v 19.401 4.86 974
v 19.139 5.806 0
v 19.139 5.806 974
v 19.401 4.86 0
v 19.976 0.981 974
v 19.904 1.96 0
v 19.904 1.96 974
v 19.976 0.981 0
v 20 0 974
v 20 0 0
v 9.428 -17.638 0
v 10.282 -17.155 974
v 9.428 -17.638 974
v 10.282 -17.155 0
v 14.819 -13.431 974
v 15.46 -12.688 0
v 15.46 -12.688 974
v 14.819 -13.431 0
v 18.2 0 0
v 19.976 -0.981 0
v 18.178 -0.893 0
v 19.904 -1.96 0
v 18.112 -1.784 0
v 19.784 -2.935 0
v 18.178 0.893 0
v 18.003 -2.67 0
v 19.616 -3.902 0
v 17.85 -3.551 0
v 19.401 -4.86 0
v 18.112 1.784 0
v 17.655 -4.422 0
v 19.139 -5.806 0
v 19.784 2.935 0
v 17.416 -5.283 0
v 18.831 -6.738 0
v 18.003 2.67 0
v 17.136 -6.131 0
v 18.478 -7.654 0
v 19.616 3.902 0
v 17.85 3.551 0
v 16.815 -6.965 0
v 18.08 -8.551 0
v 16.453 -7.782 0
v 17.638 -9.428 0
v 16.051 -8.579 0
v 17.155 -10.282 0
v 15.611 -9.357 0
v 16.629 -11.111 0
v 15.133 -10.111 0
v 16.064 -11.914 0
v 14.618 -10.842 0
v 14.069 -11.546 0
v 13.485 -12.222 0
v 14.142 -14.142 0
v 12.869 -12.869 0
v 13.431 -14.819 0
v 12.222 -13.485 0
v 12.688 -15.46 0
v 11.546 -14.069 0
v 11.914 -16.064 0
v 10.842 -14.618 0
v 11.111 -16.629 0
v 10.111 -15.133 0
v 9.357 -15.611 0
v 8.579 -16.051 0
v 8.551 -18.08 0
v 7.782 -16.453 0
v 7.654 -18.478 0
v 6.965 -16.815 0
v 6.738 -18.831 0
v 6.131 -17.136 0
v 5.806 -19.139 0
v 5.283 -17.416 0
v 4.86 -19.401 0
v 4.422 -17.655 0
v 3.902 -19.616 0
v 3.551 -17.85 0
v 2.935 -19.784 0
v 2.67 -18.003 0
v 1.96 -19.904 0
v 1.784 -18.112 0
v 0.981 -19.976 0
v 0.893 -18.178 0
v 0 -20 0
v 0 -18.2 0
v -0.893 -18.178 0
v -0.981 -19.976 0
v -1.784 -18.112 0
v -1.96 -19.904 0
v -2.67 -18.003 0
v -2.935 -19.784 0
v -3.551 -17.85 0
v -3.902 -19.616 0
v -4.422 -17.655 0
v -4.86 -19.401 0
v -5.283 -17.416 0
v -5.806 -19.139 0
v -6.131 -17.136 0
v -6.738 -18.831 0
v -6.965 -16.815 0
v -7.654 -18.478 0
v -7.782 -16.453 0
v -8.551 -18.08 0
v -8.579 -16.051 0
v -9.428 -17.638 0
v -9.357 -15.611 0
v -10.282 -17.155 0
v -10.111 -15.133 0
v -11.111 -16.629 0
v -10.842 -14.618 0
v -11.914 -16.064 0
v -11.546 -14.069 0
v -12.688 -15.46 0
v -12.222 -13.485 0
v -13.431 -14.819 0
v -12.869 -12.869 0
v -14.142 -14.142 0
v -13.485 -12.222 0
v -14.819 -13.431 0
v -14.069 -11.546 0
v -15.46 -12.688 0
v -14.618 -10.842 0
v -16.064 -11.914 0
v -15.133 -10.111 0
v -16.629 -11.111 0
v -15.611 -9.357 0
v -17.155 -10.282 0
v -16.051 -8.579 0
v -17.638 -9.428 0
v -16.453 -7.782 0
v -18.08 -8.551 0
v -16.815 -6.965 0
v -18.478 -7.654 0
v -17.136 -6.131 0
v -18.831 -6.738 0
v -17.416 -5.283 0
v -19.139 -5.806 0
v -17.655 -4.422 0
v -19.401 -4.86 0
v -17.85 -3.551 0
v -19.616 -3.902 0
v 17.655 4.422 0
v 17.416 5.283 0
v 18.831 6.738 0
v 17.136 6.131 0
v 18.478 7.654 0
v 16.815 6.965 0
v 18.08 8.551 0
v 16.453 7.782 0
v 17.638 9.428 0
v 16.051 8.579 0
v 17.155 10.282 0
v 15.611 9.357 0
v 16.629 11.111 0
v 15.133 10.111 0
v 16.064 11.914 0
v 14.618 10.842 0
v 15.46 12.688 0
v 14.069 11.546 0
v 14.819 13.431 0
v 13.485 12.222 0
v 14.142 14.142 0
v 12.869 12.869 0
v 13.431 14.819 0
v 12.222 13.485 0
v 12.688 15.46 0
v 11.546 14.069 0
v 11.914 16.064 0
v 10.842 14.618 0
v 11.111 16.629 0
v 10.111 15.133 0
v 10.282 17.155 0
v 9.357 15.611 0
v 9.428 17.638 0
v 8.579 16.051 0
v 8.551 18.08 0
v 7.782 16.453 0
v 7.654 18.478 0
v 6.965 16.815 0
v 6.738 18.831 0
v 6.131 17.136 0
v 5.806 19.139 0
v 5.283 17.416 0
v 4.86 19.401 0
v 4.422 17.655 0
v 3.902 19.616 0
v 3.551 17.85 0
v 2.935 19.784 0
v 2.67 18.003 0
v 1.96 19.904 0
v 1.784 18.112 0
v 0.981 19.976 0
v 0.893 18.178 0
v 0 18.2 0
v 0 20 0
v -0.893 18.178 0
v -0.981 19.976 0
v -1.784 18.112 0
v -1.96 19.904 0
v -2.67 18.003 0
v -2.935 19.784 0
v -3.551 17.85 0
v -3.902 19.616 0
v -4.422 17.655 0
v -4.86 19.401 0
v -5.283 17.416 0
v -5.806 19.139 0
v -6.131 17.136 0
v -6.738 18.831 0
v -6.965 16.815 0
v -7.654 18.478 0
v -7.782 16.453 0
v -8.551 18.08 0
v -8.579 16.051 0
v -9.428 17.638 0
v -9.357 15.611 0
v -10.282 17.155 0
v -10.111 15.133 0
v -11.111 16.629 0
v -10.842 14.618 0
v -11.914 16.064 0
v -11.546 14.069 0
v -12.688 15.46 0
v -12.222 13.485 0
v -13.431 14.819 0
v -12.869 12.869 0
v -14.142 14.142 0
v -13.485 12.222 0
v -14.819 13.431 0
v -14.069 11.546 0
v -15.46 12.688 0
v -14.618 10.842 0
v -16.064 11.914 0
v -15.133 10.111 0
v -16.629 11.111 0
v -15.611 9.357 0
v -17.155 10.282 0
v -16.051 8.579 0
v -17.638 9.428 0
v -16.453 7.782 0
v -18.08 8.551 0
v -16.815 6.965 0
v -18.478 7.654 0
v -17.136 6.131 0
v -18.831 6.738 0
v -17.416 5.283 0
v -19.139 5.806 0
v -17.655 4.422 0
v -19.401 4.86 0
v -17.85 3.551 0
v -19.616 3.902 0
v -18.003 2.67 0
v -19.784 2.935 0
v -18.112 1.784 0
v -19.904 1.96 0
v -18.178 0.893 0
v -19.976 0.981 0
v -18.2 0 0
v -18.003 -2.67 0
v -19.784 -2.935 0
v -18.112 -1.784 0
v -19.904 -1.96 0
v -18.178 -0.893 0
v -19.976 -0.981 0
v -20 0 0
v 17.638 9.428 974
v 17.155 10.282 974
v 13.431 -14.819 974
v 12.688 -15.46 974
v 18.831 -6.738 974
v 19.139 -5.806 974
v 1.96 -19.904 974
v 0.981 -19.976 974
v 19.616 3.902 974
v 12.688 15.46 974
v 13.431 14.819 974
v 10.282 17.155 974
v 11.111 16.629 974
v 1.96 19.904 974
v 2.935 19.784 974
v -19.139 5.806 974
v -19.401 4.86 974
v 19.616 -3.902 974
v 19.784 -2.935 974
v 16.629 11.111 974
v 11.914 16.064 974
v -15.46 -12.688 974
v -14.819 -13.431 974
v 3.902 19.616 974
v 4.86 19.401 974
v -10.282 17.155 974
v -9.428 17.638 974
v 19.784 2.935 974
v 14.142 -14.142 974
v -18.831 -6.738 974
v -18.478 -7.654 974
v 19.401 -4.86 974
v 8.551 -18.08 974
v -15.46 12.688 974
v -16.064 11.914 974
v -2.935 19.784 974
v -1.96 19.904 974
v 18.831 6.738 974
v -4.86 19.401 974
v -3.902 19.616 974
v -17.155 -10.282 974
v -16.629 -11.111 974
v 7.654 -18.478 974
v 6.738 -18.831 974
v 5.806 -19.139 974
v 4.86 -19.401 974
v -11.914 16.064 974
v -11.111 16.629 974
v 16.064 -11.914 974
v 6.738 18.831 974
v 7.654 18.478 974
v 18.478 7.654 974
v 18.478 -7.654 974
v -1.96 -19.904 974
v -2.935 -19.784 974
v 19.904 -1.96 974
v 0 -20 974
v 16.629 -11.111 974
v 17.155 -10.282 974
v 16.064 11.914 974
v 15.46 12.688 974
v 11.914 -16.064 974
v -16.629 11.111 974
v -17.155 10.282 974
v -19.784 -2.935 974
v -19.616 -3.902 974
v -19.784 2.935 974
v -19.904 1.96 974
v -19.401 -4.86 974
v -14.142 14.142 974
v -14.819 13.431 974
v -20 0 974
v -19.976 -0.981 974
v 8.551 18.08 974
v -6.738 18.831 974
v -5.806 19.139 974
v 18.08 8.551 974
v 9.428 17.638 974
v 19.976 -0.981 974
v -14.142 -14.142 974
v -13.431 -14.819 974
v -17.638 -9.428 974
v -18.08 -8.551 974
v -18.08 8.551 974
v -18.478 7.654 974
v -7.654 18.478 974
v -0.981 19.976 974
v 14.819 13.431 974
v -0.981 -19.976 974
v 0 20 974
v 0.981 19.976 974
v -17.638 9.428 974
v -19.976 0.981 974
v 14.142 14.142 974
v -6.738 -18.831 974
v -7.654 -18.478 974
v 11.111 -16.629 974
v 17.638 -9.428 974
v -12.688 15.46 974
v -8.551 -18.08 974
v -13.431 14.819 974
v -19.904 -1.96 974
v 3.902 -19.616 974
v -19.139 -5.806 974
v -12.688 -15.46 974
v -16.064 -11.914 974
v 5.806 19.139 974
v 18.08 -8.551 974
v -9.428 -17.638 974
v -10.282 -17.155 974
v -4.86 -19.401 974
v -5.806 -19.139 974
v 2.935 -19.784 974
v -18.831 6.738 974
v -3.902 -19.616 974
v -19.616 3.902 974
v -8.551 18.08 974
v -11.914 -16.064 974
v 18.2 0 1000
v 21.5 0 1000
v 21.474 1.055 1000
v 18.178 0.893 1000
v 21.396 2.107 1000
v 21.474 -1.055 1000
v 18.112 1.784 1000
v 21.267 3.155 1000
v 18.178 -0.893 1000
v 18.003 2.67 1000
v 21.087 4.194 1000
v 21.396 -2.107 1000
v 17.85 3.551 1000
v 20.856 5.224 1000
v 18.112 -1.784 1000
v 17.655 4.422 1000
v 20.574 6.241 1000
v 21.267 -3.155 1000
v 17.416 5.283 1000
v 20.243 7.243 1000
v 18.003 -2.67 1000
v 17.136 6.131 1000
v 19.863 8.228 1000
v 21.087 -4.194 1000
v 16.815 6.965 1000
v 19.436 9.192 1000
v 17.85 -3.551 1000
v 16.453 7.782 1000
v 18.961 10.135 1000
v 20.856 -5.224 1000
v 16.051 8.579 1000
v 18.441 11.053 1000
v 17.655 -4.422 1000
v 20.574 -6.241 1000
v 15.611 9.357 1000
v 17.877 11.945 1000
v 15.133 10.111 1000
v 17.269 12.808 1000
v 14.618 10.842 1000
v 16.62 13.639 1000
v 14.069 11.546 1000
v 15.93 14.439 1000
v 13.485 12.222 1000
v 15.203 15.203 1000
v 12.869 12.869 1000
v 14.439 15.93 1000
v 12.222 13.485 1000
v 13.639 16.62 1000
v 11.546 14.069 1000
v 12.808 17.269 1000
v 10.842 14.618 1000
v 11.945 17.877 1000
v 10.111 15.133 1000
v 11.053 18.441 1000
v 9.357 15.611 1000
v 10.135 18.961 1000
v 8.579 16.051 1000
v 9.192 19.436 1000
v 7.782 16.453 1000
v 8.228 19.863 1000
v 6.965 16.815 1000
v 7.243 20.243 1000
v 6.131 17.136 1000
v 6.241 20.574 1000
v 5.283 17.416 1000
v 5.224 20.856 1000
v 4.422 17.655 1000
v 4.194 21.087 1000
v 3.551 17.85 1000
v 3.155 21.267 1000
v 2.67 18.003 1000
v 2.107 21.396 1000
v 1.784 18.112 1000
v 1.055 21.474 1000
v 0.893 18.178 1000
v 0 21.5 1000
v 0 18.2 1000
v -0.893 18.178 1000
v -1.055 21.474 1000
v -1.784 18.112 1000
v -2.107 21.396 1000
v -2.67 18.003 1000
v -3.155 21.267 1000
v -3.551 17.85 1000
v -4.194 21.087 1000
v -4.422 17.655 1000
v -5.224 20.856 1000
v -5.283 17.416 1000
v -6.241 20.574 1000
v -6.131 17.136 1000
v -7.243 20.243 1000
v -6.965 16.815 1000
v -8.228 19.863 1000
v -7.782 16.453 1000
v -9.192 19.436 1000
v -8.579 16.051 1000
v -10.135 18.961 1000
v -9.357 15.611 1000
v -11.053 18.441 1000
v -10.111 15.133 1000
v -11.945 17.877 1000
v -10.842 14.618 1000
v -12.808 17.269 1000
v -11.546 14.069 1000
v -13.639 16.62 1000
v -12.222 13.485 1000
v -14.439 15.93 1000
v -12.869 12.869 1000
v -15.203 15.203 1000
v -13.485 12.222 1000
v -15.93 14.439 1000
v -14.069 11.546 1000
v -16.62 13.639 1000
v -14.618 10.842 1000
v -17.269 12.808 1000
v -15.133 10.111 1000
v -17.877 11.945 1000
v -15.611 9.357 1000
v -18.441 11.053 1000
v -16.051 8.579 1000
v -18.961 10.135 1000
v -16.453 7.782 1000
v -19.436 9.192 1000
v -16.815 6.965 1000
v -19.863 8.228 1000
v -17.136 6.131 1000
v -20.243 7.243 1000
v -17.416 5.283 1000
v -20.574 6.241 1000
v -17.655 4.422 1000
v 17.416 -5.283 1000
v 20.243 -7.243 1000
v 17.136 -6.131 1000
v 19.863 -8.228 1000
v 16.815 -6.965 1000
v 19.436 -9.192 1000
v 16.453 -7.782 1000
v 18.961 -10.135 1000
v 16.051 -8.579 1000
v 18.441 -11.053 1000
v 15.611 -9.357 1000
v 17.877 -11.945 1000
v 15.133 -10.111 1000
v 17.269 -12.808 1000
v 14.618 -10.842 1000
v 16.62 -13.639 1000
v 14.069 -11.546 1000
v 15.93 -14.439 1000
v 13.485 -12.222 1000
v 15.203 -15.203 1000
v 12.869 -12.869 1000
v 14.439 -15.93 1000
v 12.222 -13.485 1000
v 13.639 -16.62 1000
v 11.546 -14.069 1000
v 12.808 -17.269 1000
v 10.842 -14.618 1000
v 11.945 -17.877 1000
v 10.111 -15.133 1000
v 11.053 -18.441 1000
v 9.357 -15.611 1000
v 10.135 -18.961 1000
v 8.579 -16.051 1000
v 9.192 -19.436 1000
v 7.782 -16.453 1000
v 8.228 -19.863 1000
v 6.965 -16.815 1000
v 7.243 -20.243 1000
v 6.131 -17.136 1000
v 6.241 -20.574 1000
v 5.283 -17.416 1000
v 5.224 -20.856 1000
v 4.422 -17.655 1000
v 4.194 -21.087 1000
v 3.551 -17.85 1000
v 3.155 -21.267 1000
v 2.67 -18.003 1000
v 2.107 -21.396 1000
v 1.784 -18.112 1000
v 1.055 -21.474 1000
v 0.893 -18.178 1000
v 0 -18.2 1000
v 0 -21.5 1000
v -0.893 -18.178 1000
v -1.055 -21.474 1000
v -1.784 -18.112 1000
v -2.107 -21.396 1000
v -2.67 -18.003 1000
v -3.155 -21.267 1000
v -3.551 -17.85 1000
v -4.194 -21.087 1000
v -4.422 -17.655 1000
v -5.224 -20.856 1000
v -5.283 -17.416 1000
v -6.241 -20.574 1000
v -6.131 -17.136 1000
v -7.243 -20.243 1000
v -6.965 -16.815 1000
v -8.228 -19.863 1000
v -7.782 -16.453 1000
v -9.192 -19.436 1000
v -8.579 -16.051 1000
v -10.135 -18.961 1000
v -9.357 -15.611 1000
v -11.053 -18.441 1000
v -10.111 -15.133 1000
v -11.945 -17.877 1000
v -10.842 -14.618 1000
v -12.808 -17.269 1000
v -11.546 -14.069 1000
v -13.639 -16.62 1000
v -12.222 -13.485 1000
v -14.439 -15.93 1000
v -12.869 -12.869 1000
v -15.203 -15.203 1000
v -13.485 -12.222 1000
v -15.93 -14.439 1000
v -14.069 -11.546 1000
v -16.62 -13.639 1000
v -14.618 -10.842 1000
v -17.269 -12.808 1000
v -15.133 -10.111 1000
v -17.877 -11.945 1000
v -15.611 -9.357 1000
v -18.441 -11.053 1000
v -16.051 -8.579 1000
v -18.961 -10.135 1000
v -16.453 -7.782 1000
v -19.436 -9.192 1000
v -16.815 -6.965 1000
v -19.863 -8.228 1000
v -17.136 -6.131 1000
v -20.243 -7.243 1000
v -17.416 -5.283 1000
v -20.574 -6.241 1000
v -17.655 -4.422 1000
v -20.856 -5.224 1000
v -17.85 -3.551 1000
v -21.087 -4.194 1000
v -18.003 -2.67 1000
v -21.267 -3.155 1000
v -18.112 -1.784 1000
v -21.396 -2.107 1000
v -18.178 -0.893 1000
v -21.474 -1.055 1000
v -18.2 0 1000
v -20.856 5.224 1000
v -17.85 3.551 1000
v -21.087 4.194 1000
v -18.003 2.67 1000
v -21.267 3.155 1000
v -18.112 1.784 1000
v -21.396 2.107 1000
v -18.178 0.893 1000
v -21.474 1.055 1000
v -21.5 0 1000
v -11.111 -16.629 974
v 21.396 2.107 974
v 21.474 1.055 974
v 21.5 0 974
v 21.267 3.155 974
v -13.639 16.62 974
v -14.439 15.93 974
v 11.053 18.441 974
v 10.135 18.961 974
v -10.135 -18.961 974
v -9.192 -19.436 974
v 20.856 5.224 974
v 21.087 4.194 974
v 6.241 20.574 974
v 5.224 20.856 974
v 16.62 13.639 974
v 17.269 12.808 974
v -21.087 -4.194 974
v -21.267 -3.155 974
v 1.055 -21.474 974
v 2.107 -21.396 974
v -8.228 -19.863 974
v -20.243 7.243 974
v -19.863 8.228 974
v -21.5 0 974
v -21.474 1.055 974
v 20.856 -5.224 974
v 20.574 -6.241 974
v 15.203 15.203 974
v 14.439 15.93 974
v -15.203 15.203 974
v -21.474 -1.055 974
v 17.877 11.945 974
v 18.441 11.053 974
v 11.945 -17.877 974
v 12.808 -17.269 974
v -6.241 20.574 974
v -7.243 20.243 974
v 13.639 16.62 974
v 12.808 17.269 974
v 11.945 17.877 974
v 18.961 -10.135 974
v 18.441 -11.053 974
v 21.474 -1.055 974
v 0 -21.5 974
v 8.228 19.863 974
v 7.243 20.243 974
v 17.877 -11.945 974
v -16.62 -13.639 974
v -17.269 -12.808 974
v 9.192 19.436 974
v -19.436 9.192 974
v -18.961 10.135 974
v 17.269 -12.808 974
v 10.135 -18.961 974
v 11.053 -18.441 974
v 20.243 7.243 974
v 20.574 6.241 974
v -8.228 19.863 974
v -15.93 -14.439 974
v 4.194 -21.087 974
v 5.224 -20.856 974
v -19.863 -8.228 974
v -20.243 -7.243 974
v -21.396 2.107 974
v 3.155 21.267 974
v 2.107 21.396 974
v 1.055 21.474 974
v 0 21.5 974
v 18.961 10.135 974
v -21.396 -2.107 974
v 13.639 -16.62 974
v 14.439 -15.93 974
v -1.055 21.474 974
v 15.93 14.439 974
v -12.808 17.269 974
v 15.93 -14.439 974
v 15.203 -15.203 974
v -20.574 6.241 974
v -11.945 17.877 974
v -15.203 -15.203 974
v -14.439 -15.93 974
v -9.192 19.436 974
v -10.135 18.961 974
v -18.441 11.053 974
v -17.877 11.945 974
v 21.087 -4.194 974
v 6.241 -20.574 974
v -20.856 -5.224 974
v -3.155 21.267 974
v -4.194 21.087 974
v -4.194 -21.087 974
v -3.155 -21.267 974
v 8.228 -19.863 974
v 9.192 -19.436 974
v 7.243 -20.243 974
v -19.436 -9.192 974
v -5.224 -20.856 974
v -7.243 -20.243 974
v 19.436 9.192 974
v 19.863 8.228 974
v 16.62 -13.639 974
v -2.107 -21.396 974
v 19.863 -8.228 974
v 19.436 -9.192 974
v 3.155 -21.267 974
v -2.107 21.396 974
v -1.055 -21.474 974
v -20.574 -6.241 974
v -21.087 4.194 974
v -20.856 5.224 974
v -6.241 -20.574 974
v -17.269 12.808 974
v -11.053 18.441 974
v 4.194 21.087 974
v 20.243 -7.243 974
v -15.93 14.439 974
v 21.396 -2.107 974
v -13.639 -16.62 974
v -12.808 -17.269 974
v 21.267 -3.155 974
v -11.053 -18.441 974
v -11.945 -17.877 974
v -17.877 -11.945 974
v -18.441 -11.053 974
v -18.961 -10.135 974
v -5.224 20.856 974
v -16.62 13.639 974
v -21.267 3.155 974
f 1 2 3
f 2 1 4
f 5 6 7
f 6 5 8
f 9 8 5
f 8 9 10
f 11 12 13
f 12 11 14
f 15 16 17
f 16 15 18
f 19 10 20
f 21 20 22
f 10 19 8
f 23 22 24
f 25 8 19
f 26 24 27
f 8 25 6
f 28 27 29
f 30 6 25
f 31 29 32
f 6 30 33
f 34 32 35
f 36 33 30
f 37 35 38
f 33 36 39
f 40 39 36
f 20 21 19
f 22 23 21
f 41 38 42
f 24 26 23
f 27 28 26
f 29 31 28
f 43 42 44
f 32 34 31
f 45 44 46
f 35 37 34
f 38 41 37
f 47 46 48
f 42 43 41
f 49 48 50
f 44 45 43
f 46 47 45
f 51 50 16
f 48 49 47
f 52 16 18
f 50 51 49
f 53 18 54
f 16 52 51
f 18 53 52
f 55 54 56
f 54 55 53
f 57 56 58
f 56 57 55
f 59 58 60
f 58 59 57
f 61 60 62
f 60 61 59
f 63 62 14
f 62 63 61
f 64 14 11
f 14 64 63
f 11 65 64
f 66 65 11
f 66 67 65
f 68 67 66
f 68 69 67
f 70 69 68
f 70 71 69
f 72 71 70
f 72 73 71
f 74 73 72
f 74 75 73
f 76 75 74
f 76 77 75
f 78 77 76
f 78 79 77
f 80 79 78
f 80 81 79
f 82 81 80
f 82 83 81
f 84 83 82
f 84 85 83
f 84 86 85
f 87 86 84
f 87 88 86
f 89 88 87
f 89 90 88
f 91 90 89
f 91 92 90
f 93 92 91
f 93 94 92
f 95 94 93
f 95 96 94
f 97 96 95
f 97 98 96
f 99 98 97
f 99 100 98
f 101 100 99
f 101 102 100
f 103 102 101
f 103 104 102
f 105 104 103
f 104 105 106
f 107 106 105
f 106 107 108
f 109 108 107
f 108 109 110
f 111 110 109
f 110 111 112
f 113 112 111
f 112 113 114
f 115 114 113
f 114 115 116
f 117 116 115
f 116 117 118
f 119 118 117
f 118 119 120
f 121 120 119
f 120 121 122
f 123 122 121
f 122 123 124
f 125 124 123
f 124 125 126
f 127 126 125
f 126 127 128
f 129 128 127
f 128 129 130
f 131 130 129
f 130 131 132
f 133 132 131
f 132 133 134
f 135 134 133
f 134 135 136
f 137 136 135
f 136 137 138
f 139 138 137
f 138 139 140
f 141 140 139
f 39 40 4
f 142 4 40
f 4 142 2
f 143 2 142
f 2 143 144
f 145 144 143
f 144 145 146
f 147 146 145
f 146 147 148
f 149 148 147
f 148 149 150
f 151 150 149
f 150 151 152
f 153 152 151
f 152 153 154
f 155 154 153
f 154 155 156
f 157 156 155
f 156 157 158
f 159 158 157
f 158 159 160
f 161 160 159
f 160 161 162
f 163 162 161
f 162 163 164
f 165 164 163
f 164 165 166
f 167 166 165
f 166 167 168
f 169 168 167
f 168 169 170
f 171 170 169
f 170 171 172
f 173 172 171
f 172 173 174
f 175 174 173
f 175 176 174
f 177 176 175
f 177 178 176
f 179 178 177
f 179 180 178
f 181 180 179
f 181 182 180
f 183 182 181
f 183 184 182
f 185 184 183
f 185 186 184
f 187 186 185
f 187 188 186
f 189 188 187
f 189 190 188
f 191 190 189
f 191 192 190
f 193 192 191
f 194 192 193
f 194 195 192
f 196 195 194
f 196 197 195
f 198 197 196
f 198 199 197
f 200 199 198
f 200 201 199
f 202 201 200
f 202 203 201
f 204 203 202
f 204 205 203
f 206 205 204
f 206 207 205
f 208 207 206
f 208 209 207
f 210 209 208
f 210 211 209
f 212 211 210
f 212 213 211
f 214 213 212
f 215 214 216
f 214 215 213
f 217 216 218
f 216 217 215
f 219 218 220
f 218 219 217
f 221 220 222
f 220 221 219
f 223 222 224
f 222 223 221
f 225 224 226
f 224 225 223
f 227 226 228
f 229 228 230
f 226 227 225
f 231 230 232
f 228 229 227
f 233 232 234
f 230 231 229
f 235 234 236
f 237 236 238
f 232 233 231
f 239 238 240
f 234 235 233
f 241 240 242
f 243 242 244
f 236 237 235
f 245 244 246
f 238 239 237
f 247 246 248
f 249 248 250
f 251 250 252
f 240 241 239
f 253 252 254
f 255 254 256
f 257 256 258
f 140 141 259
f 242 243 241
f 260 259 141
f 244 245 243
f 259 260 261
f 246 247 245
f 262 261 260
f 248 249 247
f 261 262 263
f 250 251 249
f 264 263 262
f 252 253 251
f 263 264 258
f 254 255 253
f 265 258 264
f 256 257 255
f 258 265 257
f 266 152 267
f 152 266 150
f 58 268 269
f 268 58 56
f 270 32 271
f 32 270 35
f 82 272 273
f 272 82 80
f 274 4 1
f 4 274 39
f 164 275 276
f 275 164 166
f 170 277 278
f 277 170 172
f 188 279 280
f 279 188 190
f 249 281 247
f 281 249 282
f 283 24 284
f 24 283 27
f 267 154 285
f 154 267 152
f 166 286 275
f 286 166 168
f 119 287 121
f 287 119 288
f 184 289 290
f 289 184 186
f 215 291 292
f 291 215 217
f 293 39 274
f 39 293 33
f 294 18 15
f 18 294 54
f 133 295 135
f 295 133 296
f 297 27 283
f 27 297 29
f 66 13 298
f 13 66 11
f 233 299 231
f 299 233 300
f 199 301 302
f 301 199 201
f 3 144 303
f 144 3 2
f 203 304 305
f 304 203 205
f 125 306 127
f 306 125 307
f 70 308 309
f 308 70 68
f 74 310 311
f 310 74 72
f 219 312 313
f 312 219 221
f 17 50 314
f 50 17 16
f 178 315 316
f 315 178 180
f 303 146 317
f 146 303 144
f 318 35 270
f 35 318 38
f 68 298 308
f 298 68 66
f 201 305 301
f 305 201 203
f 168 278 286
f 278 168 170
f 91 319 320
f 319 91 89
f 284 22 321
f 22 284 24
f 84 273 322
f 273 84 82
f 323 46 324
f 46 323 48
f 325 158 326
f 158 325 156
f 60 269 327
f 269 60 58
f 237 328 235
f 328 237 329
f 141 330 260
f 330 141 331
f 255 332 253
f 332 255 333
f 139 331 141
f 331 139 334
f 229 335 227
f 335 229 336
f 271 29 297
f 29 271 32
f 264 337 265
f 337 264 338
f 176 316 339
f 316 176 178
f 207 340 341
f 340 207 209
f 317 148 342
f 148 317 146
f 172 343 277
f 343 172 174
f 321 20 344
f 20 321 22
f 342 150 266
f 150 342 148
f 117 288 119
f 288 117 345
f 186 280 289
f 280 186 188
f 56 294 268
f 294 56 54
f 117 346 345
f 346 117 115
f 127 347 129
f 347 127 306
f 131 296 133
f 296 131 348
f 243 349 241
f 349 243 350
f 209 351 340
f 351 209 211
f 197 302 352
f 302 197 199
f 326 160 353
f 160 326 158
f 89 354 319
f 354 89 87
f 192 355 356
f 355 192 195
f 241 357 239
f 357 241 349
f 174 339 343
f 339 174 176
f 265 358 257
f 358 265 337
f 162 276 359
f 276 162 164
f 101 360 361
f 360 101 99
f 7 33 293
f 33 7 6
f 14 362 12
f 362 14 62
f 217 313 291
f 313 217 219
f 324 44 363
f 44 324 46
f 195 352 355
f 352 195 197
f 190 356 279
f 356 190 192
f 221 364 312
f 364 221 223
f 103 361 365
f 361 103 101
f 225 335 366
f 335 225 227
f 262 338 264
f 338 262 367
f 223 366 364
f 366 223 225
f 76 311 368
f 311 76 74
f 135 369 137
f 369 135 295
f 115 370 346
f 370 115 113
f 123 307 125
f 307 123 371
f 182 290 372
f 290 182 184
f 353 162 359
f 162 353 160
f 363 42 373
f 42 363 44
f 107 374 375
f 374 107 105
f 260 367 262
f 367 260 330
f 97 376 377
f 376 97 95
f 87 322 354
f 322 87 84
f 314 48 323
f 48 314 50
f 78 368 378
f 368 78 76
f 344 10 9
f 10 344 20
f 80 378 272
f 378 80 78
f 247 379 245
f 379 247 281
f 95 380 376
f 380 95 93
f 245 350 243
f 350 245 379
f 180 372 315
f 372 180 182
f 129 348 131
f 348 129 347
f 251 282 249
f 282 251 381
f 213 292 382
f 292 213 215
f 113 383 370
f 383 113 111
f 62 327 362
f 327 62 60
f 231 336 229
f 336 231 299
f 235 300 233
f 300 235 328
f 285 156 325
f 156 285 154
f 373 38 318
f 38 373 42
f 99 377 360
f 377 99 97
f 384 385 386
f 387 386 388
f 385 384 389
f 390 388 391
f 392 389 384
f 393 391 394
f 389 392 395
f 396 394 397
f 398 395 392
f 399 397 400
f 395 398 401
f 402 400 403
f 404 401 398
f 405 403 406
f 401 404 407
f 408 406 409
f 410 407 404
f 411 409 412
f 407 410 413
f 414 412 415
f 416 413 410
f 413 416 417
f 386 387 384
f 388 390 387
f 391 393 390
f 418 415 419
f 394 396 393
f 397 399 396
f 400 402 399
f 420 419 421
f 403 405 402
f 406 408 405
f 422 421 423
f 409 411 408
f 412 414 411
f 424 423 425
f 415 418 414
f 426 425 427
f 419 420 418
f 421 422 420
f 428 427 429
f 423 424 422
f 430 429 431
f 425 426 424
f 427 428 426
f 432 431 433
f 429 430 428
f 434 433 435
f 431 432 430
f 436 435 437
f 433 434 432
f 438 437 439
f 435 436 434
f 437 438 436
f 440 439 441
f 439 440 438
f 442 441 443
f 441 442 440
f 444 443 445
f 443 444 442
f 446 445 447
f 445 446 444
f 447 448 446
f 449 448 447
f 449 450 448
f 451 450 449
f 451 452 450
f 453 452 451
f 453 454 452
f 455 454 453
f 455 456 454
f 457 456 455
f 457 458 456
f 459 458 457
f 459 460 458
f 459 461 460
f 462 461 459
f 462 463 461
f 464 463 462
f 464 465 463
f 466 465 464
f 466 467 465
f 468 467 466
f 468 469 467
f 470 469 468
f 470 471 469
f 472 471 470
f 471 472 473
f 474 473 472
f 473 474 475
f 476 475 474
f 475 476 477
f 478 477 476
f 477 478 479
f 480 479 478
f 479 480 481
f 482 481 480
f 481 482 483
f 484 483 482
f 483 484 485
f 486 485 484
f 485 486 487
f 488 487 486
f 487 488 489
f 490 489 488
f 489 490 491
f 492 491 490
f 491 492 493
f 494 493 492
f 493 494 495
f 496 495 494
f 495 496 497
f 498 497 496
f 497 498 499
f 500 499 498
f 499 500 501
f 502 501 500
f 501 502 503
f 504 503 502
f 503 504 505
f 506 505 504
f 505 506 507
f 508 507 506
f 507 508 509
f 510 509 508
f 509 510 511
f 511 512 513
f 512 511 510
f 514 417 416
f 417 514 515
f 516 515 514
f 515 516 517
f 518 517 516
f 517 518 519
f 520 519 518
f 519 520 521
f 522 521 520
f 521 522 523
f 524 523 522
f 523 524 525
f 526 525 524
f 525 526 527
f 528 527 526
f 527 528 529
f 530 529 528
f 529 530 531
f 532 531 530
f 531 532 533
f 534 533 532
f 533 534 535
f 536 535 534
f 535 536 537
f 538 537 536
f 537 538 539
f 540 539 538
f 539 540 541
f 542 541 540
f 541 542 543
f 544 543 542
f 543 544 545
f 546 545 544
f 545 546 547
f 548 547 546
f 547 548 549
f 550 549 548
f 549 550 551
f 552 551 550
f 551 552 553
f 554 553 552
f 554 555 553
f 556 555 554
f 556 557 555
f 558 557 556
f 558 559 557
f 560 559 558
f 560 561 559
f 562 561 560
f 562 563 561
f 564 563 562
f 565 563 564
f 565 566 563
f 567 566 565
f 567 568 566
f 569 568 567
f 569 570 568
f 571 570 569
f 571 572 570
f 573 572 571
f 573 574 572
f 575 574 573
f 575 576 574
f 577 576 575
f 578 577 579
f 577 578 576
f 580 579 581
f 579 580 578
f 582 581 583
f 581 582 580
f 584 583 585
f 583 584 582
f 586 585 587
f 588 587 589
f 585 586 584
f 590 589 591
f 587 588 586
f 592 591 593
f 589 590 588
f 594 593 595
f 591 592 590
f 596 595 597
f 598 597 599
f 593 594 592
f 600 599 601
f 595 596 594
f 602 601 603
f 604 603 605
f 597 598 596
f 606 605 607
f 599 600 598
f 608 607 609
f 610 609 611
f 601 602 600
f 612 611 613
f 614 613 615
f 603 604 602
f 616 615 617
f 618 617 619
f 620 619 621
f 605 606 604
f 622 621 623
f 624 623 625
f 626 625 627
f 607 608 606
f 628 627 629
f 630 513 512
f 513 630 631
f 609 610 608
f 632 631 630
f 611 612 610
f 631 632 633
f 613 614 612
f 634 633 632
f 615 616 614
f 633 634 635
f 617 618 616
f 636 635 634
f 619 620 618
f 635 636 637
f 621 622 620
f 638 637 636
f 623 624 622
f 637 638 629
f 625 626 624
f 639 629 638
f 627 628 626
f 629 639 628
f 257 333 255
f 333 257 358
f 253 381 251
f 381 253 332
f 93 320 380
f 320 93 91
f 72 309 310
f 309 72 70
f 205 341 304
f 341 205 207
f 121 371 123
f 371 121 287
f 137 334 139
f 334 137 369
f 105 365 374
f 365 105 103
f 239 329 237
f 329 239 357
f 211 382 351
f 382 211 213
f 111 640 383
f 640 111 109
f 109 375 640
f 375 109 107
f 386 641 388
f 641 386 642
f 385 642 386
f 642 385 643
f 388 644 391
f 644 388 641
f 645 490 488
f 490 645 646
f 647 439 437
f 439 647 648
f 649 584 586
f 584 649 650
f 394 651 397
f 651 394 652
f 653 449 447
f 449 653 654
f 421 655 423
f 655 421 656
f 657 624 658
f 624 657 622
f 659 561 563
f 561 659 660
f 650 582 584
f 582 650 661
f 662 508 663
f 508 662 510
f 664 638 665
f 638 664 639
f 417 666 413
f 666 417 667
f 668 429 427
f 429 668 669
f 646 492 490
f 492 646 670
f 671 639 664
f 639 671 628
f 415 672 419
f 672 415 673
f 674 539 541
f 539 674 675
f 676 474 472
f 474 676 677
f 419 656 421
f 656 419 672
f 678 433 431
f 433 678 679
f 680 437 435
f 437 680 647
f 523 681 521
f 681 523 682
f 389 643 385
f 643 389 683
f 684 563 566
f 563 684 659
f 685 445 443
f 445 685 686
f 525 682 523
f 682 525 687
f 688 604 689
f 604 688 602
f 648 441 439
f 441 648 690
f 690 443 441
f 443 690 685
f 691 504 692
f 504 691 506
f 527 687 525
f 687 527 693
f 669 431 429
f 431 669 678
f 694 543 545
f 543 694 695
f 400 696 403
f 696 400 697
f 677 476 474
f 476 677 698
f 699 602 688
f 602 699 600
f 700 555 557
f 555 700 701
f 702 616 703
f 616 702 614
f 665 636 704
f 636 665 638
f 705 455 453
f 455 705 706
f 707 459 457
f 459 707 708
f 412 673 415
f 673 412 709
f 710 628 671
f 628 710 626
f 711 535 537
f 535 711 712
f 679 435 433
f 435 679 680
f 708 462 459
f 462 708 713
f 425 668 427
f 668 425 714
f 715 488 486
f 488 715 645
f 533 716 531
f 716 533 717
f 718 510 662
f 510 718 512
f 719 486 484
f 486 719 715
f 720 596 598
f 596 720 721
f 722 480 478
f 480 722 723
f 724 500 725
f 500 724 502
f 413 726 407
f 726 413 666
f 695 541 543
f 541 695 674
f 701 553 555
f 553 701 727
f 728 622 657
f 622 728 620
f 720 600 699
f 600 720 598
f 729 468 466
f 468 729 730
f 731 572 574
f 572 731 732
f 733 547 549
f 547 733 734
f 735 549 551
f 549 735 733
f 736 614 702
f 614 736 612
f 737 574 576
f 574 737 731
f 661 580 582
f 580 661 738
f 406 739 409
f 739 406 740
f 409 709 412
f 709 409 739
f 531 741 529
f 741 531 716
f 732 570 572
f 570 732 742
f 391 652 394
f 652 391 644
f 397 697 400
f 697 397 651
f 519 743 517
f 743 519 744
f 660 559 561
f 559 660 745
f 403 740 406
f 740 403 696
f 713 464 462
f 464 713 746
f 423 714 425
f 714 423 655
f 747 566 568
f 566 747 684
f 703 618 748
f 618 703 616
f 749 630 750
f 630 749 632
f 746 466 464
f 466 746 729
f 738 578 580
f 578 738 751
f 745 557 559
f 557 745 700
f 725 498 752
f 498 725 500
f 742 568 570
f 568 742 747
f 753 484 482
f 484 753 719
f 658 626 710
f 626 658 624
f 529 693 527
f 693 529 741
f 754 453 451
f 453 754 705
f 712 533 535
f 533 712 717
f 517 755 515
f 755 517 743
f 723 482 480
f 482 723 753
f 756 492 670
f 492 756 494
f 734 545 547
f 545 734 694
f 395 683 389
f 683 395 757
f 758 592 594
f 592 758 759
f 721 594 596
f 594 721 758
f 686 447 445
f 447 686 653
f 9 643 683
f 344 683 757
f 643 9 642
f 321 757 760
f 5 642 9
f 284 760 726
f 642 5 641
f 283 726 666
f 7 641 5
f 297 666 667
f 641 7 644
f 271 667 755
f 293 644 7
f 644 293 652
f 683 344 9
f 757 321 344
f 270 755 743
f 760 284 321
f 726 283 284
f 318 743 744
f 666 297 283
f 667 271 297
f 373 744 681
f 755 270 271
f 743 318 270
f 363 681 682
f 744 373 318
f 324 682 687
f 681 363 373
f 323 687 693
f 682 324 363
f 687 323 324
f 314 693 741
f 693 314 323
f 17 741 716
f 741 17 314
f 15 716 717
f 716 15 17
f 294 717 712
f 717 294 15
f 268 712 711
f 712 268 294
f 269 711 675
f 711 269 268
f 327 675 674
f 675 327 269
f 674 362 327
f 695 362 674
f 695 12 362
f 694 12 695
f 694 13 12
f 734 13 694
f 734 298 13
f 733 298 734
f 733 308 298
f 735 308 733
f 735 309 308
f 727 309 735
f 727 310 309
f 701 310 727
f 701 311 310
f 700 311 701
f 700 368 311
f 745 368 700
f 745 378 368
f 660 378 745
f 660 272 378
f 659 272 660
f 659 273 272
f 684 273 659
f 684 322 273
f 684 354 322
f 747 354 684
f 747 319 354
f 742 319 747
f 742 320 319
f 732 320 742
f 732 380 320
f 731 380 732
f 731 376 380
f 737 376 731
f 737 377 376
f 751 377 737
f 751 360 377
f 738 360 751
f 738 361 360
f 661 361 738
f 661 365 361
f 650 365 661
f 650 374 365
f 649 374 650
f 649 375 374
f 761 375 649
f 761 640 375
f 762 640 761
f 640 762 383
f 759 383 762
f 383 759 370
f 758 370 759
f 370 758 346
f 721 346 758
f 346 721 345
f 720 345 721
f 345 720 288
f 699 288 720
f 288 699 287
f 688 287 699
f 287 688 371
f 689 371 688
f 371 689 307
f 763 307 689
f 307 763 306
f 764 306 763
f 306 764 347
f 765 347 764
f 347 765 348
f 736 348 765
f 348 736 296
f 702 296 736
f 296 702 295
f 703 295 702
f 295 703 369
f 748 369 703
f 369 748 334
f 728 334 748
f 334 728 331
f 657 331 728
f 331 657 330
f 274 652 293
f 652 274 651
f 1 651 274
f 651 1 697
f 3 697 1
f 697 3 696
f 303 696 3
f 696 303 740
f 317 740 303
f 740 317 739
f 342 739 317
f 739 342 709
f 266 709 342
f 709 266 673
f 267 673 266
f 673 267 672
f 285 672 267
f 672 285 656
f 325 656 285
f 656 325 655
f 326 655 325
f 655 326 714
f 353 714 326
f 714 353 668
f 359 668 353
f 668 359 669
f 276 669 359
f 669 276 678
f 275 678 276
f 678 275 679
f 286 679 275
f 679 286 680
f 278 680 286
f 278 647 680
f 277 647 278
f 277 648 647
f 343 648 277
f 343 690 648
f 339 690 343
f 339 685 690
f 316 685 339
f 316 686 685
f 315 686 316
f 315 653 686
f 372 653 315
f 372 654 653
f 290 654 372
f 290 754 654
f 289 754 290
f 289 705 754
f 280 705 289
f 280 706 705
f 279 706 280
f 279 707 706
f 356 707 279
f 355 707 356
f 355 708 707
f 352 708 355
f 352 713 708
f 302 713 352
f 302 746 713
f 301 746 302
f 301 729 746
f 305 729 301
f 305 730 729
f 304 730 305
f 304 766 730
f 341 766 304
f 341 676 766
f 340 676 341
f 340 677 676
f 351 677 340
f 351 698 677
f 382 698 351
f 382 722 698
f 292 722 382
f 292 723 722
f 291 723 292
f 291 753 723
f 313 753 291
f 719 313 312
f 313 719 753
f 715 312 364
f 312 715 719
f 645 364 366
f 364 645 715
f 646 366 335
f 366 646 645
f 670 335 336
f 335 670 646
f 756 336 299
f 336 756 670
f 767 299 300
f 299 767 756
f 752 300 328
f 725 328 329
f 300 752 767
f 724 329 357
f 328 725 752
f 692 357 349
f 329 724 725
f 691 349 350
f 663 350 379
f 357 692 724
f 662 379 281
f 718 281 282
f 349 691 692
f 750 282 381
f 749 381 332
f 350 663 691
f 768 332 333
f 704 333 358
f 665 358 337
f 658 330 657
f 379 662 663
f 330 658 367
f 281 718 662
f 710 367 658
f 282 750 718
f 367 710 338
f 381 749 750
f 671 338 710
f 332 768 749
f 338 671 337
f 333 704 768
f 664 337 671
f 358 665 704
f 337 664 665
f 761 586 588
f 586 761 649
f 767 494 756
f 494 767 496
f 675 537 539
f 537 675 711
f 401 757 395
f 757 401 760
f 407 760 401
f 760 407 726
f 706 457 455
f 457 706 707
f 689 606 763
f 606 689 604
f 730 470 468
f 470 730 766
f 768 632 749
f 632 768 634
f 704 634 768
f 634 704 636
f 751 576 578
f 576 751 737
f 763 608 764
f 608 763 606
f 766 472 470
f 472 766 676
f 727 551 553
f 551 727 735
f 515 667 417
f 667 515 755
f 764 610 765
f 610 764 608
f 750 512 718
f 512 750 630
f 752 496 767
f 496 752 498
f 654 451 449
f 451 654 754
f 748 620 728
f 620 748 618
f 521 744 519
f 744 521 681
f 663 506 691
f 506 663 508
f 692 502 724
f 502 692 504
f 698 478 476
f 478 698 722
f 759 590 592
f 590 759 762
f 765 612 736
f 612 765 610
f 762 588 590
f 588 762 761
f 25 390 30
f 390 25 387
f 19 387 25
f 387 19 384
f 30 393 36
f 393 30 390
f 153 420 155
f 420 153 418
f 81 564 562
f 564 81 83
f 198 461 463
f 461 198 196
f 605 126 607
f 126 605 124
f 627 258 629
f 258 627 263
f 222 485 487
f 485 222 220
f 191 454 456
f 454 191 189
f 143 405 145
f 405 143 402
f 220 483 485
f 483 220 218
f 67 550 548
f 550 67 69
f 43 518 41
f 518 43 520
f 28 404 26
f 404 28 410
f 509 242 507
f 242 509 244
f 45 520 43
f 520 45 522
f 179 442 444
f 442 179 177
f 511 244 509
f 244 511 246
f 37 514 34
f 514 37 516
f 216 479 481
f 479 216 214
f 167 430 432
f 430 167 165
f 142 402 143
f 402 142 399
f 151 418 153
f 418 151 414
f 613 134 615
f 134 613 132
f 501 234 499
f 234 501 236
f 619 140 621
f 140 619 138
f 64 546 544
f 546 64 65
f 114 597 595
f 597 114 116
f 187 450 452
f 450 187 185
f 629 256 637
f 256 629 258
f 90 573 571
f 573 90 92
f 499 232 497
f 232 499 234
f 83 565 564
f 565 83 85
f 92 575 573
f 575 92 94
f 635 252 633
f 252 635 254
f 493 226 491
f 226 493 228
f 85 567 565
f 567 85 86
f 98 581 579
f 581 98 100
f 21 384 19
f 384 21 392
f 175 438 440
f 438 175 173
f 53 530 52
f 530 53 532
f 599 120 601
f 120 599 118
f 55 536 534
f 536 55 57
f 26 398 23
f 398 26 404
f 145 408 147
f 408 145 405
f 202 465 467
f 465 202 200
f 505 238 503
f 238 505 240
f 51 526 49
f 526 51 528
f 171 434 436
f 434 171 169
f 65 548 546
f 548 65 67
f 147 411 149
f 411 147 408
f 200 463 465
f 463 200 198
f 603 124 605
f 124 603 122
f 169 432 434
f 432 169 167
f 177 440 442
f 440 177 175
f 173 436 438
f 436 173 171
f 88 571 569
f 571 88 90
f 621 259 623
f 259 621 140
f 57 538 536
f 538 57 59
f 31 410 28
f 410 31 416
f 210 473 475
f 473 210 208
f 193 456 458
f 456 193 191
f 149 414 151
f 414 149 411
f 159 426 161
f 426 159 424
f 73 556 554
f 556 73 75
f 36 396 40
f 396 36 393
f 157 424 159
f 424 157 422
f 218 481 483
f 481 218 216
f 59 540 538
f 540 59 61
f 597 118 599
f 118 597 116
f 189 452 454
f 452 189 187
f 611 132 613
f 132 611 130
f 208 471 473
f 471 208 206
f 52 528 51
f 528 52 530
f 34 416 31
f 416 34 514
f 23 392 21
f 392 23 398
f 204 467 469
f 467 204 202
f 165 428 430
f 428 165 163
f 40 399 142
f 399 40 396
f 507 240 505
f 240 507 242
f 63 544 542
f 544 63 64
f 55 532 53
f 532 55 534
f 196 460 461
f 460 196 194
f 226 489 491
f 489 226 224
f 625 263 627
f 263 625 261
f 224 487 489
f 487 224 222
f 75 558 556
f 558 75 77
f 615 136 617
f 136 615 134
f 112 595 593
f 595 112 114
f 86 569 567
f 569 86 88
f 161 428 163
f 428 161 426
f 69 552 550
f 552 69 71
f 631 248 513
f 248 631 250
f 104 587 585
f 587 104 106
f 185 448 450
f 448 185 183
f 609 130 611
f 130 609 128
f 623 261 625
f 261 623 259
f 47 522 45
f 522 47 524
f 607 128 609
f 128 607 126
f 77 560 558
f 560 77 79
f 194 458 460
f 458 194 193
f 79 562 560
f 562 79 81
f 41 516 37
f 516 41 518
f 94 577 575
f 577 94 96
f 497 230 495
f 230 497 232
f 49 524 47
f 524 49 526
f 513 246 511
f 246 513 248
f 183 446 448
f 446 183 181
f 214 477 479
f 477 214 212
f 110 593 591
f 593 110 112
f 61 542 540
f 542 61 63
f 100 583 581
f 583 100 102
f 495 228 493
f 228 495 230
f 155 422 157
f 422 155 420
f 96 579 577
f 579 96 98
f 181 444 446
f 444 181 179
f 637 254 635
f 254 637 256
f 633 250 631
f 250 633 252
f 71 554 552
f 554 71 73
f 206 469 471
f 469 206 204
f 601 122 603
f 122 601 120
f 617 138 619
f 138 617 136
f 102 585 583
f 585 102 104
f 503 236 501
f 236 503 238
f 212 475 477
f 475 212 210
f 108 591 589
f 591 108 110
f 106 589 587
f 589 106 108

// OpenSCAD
// Parameters
pipe_standard = 0; //[0:0:1]
nominal_size = 40; //[20:80:1]
length_mm = 1000; //[500:2000:10]
center = 0; //[0:1:1]
include_end_fitting = 1; //[0:1:1]
ht40_od = 40; //[30:60:0.5]
ht40_wall = 1.8; //[1:3.6:0.1]
end_interface_length = 25; //[10:60:1]
end_interface_radial = 1.5; //[0.5:4:0.1]
connect_overlap = 1; //[0.5:2:0.1]

$fn = 128;

// HT Pipe - one connected solid
module ht_pipe() {
  od_r = ht40_od/2;
  id_r = max(0.01, od_r - ht40_wall);

  // Z placement (optionally centered)
  z0 = (center == 1) ? -length_mm/2 : 0;

  // End fitting placement (connected to main pipe with overlap)
  fit_h = end_interface_length;
  fit_r = od_r + end_interface_radial;
  fit_z = z0 + length_mm - fit_h - connect_overlap; // overlaps into main by connect_overlap

  color([0.85, 0.85, 0.8])
  difference() {
    // OUTER: union of main pipe + optional end fitting (connected)
    union() {
      translate([0, 0, z0])
        cylinder(h=length_mm, r=od_r, center=false);

      if (include_end_fitting)
        translate([0, 0, fit_z])
          cylinder(h=fit_h + connect_overlap, r=fit_r, center=false);
    }

    // INNER VOID: continuous bore through entire length (and through fitting)
    translate([0, 0, z0 - connect_overlap])
      cylinder(h=length_mm + 2*connect_overlap, r=id_r, center=false);
  }
}

// Assembly
module assembly() {
  ht_pipe();
}

assembly();
